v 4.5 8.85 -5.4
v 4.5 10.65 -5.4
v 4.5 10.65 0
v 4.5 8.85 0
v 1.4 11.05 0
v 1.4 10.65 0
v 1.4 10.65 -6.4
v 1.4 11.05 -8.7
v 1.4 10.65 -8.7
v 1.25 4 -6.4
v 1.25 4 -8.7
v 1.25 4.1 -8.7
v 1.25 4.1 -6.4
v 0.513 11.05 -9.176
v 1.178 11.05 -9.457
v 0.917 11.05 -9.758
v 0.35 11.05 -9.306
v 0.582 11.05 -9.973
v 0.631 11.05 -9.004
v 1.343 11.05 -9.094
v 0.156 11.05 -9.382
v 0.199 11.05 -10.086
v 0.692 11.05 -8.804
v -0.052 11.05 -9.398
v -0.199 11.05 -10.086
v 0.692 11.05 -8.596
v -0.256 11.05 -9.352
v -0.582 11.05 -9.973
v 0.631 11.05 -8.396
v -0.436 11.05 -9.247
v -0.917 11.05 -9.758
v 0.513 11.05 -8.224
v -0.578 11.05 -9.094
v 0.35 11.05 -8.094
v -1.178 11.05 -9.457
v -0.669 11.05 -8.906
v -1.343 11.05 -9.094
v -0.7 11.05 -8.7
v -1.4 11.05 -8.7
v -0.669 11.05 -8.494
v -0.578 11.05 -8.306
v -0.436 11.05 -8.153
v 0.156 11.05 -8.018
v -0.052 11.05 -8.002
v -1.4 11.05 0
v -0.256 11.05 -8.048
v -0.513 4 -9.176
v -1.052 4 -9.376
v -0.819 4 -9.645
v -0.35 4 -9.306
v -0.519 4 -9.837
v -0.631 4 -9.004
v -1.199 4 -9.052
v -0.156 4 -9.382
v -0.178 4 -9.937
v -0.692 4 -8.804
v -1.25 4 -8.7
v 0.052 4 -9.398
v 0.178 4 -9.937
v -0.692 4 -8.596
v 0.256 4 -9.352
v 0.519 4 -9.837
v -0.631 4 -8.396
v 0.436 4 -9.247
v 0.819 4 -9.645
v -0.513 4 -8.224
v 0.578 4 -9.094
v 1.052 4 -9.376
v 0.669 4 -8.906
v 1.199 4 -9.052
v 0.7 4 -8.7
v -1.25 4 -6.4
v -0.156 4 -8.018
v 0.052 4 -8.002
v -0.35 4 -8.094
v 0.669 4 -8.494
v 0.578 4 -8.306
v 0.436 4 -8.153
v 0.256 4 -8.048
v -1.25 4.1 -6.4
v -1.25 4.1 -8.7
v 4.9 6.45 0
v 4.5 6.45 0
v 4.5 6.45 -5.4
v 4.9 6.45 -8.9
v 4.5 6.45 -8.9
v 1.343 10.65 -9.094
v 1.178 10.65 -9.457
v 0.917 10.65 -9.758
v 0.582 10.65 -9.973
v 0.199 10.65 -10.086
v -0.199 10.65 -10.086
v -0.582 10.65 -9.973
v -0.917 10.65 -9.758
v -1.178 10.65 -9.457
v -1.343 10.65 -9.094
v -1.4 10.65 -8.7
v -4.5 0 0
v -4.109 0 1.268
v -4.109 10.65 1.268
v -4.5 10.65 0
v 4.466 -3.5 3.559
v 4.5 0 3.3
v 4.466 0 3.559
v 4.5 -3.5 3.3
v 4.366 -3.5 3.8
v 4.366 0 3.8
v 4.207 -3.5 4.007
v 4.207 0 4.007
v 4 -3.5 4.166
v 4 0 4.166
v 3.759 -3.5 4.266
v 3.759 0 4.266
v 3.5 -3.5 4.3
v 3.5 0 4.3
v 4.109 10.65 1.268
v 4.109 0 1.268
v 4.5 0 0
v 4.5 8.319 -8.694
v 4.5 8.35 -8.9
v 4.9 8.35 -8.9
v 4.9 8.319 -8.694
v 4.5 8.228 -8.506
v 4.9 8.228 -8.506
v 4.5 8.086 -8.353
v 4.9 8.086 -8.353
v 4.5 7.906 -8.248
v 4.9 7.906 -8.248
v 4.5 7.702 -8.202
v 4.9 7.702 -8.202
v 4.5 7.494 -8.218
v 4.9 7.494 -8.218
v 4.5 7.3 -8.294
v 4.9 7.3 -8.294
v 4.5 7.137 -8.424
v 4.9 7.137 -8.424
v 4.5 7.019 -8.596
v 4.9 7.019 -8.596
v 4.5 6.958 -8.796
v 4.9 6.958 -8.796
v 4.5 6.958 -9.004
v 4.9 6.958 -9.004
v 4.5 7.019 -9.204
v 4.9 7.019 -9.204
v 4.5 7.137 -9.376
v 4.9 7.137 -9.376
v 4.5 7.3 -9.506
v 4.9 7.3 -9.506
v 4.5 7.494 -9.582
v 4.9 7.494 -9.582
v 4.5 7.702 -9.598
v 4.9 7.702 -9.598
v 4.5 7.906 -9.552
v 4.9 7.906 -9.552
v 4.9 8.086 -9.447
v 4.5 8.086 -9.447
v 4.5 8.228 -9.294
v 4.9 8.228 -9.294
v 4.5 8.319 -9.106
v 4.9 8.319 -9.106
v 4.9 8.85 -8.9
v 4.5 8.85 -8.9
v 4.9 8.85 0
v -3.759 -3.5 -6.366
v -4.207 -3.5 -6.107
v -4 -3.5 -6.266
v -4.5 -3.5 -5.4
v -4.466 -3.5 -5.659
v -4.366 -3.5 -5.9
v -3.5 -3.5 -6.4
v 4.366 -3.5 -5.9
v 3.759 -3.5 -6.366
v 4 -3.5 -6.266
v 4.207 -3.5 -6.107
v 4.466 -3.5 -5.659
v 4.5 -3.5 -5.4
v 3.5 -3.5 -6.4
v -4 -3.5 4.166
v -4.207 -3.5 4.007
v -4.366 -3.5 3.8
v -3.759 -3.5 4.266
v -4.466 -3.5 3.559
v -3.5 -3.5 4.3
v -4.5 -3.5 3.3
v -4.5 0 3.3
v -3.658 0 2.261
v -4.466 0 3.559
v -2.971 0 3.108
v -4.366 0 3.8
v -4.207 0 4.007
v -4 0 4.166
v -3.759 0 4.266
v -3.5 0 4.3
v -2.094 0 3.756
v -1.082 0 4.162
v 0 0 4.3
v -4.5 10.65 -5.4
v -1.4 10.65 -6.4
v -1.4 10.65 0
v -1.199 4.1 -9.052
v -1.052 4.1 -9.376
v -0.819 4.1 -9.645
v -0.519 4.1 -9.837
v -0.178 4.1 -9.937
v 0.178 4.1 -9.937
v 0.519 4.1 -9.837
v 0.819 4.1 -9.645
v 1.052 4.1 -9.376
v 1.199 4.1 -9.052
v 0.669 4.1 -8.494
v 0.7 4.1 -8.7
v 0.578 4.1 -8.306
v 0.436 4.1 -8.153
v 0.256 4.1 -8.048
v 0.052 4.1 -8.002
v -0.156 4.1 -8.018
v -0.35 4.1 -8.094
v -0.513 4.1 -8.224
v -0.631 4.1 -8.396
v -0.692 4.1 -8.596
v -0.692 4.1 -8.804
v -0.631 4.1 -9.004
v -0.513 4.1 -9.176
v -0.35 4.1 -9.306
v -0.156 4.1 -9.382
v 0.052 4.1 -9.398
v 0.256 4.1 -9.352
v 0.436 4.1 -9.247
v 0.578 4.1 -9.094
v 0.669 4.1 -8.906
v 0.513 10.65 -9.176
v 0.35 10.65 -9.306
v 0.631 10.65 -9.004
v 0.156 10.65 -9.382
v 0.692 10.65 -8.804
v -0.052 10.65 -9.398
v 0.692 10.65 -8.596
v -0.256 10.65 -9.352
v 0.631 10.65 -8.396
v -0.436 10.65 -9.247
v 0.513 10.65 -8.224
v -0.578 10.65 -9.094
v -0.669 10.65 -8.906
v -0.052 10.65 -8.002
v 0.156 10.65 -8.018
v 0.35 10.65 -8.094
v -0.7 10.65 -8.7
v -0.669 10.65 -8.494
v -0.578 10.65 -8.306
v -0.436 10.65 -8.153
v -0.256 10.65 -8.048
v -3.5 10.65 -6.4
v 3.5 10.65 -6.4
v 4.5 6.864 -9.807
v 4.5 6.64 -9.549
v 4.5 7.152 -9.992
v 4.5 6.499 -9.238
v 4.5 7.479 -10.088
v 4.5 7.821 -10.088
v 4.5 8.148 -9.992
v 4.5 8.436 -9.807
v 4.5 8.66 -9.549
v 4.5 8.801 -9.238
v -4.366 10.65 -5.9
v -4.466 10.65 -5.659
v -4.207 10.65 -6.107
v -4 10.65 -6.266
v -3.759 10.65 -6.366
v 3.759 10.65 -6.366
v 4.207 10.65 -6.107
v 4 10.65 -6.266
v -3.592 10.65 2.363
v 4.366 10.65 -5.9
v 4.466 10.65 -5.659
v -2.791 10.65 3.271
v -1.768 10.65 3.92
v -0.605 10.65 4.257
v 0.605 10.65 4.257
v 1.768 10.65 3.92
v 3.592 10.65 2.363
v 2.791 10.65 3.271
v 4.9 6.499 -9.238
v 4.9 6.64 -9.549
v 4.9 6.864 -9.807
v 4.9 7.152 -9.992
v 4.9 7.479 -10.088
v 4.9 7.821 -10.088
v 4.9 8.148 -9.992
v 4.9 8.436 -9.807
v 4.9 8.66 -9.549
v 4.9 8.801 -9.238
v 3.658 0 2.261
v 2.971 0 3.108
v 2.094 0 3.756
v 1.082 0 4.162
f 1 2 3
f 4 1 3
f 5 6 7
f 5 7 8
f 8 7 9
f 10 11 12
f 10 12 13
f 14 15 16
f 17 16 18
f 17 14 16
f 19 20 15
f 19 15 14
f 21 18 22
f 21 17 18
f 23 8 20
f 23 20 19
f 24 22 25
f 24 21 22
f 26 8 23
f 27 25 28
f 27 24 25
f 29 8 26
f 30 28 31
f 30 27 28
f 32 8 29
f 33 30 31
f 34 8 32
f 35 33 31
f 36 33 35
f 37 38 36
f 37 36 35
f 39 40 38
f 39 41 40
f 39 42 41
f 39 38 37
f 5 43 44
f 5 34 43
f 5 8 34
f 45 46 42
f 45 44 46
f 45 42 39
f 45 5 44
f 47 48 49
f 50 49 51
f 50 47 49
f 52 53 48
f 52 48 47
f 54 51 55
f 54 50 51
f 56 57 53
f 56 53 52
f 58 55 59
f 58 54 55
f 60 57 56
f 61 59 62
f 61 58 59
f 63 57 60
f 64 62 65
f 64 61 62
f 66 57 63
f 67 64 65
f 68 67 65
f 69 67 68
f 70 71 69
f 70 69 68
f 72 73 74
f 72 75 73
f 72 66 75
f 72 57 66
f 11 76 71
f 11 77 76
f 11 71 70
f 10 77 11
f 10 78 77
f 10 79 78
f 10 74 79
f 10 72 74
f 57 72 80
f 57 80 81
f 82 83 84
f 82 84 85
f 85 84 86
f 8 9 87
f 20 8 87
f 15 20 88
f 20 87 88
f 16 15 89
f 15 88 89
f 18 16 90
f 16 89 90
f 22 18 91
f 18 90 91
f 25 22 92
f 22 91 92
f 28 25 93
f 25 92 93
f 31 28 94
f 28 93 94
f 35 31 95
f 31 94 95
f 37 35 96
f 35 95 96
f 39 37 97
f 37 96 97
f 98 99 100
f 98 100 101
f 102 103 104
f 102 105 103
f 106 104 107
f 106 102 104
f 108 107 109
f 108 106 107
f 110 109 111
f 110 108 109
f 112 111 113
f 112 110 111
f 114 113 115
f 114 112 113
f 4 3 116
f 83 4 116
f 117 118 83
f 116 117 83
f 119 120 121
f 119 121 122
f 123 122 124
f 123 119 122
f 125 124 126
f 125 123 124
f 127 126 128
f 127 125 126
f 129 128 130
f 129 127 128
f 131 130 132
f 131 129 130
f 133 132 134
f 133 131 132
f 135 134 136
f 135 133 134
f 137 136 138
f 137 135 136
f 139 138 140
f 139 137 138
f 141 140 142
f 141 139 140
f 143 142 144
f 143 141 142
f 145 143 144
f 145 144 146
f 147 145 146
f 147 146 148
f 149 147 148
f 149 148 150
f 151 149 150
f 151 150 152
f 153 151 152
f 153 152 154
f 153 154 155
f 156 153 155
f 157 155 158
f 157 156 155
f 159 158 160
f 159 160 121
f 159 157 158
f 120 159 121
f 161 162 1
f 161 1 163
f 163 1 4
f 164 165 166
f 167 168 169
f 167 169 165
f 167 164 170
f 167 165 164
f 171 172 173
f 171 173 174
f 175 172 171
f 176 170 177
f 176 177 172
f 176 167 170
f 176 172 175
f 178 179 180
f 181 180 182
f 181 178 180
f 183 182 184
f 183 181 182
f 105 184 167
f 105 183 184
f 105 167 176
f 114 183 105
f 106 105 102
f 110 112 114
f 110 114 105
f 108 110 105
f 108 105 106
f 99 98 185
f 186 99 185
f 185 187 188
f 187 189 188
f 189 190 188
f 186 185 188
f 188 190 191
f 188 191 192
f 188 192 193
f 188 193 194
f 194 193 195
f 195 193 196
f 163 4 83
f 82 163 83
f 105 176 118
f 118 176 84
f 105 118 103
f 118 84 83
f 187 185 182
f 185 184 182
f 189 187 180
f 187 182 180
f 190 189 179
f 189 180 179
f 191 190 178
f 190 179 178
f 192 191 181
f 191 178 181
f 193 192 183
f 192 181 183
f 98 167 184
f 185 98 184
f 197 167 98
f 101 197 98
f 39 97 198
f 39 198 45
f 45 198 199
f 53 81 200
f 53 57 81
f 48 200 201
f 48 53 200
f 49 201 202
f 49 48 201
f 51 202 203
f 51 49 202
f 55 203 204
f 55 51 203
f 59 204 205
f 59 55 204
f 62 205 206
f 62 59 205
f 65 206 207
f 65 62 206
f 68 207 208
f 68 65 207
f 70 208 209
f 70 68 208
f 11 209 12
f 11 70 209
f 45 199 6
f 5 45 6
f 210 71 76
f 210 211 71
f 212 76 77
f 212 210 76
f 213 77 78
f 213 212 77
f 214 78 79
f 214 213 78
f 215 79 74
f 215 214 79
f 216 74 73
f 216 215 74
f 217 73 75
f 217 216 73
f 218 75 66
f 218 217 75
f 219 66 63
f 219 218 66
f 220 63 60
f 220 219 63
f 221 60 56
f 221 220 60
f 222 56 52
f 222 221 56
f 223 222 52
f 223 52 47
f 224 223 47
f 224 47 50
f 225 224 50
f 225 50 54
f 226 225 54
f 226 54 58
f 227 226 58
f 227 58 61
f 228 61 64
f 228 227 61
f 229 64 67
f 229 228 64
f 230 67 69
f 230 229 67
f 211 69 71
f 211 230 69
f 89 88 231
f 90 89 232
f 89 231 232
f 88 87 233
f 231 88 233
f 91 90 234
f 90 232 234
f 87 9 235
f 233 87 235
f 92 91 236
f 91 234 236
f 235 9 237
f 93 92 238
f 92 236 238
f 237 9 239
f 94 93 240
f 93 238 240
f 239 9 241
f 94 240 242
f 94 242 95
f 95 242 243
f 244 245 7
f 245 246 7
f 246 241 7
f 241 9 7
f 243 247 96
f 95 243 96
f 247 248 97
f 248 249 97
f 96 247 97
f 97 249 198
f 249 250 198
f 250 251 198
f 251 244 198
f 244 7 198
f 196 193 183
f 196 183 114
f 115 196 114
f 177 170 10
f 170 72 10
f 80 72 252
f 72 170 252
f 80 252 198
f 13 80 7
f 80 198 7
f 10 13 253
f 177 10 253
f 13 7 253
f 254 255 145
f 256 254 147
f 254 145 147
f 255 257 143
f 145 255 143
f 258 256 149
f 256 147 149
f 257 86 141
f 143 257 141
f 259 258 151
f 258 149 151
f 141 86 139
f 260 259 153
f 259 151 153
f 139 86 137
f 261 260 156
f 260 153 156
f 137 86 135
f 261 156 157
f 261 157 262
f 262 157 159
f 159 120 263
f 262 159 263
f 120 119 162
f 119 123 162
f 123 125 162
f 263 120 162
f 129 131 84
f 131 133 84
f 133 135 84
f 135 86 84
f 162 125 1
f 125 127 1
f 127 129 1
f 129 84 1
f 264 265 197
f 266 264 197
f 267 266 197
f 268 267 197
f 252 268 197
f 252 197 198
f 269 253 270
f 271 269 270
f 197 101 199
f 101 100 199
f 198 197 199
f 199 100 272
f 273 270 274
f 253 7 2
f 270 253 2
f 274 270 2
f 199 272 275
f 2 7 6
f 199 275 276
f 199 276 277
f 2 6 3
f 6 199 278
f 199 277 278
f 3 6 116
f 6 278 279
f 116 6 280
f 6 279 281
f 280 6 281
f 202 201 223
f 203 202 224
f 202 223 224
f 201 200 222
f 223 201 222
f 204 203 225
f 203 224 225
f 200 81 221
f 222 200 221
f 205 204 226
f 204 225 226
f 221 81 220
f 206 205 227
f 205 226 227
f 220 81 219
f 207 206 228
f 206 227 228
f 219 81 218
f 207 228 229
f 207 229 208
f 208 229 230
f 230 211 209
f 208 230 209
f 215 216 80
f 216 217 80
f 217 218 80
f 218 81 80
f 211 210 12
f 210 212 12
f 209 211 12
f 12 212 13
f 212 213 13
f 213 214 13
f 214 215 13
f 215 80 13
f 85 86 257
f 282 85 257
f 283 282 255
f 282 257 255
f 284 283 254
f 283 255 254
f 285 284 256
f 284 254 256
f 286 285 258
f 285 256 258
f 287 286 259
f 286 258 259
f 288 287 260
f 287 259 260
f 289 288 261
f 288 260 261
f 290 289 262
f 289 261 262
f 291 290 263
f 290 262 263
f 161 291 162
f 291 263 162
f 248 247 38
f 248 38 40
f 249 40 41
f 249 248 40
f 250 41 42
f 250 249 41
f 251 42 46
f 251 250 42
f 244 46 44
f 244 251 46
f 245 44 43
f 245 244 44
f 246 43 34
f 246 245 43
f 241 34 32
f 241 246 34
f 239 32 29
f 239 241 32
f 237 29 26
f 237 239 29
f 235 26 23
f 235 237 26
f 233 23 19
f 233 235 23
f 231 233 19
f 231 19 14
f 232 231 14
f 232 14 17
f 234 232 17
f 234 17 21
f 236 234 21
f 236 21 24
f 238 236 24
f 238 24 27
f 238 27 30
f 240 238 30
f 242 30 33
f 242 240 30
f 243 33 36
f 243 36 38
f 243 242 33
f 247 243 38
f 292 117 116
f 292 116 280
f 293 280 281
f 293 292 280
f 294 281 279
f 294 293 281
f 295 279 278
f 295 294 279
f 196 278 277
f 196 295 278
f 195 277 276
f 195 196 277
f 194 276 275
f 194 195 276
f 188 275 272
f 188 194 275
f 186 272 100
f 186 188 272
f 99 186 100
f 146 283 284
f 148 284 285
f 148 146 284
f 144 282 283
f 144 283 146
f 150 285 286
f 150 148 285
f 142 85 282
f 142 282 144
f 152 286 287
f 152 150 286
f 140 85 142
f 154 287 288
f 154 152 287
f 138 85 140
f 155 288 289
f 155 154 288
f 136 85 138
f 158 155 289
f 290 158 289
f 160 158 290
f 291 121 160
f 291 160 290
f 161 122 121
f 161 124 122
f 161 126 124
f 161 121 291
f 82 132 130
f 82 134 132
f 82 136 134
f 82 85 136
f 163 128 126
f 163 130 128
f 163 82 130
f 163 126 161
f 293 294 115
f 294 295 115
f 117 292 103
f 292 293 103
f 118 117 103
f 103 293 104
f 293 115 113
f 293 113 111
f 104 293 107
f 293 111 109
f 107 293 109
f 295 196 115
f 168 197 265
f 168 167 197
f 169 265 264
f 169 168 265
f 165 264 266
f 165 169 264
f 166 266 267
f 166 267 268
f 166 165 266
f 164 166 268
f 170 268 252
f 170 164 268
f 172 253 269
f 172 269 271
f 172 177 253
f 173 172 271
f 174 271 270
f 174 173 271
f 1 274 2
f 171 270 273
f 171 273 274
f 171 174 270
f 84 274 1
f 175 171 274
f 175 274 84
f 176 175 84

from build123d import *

# Parameters (mm, degrees)
F1_DEPTH  = 10.65
F2_W      = 9
F2_H      = 10.7
F3_DEPTH  = 3.5
F4_R      = 1
F5_R      = 0.7
F6_DEPTH  = 0.4
F7_R      = 0.7
F8_DEPTH  = 0.4
F10_R     = 0.7
F11_DEPTH = 0.05


with BuildPart() as f1:
    # F0 (on Front) → F1 (new body)
    with BuildSketch(Plane.XZ):
        with BuildLine():
            ThreePointArc((4.1088888889, 1.2676876976), (0, 4.3), (-4.1088888889, 1.2676876976))
            Line((-4.1088888889, 1.2676876976), (-4.5, 0))
            Line((-4.5, 0), (-4.5, -6.4))
            Line((-4.5, -6.4), (0, -6.4))
            Line((0, -6.4), (4.5, -6.4))
            Line((4.5, -6.4), (4.5, 0))
            Line((4.5, 0), (4.1088888889, 1.2676876976))
        make_face()
    extrude(amount=-F1_DEPTH)

    # F2 (on face) → F3 (join)
    with BuildSketch(Plane.XZ):
        with Locations((0, -1.05)):
            Rectangle(F2_W, F2_H)
    extrude(amount=F3_DEPTH)

    # F4
    f4_edges = [f1.edges().sort_by_distance(p)[0] for p in [
        (4.5, -1.75, 4.3),
        (-4.5, -1.75, 4.3),
        (4.5, 3.575, -6.4),
        (-4.5, 3.575, -6.4),
    ]]
    fillet(f4_edges, radius=F4_R)

    # F5 (on face) → F6 (join)
    with BuildSketch(Plane.YZ.offset(4.5)):
        with BuildLine():
            ThreePointArc((6.45, -8.9), (7.65, -10.1), (8.85, -8.9))
            Line((8.85, -8.9), (8.85, 0))
            Line((8.85, 0), (6.45, 0))
            Line((6.45, 0), (6.45, -8.9))
        make_face()
        with Locations((7.65, -8.9)):
            Circle(F5_R, mode=Mode.SUBTRACT)
    extrude(amount=F6_DEPTH)

    # F7 (on face) → F8 (join)
    with BuildSketch(Plane(origin=(0, 10.65, 0), x_dir=(-1, 0, 0), z_dir=(0, 1, 0))):
        with BuildLine():
            ThreePointArc((-1.4, -8.7), (0, -10.1), (1.4, -8.7))
            Line((1.4, -8.7), (1.4, 0))
            Line((1.4, 0), (-1.4, 0))
            Line((-1.4, 0), (-1.4, -8.7))
        make_face()
        with Locations((0, -8.7)):
            Circle(F7_R, mode=Mode.SUBTRACT)
    extrude(amount=F8_DEPTH)

    # F10 (on offset) → F11 (join, symmetric)
    with BuildSketch(Plane.XZ.offset(-4.05)):
        with BuildLine():
            ThreePointArc((-1.25, -8.7), (0, -9.95), (1.25, -8.7))
            Line((1.25, -8.7), (1.25, 0))
            Line((1.25, 0), (-1.25, 0))
            Line((-1.25, 0), (-1.25, -8.7))
        make_face()
        with Locations((0, -8.7)):
            Circle(F10_R, mode=Mode.SUBTRACT)
    extrude(amount=F11_DEPTH, both=True)


solid = f1.part
